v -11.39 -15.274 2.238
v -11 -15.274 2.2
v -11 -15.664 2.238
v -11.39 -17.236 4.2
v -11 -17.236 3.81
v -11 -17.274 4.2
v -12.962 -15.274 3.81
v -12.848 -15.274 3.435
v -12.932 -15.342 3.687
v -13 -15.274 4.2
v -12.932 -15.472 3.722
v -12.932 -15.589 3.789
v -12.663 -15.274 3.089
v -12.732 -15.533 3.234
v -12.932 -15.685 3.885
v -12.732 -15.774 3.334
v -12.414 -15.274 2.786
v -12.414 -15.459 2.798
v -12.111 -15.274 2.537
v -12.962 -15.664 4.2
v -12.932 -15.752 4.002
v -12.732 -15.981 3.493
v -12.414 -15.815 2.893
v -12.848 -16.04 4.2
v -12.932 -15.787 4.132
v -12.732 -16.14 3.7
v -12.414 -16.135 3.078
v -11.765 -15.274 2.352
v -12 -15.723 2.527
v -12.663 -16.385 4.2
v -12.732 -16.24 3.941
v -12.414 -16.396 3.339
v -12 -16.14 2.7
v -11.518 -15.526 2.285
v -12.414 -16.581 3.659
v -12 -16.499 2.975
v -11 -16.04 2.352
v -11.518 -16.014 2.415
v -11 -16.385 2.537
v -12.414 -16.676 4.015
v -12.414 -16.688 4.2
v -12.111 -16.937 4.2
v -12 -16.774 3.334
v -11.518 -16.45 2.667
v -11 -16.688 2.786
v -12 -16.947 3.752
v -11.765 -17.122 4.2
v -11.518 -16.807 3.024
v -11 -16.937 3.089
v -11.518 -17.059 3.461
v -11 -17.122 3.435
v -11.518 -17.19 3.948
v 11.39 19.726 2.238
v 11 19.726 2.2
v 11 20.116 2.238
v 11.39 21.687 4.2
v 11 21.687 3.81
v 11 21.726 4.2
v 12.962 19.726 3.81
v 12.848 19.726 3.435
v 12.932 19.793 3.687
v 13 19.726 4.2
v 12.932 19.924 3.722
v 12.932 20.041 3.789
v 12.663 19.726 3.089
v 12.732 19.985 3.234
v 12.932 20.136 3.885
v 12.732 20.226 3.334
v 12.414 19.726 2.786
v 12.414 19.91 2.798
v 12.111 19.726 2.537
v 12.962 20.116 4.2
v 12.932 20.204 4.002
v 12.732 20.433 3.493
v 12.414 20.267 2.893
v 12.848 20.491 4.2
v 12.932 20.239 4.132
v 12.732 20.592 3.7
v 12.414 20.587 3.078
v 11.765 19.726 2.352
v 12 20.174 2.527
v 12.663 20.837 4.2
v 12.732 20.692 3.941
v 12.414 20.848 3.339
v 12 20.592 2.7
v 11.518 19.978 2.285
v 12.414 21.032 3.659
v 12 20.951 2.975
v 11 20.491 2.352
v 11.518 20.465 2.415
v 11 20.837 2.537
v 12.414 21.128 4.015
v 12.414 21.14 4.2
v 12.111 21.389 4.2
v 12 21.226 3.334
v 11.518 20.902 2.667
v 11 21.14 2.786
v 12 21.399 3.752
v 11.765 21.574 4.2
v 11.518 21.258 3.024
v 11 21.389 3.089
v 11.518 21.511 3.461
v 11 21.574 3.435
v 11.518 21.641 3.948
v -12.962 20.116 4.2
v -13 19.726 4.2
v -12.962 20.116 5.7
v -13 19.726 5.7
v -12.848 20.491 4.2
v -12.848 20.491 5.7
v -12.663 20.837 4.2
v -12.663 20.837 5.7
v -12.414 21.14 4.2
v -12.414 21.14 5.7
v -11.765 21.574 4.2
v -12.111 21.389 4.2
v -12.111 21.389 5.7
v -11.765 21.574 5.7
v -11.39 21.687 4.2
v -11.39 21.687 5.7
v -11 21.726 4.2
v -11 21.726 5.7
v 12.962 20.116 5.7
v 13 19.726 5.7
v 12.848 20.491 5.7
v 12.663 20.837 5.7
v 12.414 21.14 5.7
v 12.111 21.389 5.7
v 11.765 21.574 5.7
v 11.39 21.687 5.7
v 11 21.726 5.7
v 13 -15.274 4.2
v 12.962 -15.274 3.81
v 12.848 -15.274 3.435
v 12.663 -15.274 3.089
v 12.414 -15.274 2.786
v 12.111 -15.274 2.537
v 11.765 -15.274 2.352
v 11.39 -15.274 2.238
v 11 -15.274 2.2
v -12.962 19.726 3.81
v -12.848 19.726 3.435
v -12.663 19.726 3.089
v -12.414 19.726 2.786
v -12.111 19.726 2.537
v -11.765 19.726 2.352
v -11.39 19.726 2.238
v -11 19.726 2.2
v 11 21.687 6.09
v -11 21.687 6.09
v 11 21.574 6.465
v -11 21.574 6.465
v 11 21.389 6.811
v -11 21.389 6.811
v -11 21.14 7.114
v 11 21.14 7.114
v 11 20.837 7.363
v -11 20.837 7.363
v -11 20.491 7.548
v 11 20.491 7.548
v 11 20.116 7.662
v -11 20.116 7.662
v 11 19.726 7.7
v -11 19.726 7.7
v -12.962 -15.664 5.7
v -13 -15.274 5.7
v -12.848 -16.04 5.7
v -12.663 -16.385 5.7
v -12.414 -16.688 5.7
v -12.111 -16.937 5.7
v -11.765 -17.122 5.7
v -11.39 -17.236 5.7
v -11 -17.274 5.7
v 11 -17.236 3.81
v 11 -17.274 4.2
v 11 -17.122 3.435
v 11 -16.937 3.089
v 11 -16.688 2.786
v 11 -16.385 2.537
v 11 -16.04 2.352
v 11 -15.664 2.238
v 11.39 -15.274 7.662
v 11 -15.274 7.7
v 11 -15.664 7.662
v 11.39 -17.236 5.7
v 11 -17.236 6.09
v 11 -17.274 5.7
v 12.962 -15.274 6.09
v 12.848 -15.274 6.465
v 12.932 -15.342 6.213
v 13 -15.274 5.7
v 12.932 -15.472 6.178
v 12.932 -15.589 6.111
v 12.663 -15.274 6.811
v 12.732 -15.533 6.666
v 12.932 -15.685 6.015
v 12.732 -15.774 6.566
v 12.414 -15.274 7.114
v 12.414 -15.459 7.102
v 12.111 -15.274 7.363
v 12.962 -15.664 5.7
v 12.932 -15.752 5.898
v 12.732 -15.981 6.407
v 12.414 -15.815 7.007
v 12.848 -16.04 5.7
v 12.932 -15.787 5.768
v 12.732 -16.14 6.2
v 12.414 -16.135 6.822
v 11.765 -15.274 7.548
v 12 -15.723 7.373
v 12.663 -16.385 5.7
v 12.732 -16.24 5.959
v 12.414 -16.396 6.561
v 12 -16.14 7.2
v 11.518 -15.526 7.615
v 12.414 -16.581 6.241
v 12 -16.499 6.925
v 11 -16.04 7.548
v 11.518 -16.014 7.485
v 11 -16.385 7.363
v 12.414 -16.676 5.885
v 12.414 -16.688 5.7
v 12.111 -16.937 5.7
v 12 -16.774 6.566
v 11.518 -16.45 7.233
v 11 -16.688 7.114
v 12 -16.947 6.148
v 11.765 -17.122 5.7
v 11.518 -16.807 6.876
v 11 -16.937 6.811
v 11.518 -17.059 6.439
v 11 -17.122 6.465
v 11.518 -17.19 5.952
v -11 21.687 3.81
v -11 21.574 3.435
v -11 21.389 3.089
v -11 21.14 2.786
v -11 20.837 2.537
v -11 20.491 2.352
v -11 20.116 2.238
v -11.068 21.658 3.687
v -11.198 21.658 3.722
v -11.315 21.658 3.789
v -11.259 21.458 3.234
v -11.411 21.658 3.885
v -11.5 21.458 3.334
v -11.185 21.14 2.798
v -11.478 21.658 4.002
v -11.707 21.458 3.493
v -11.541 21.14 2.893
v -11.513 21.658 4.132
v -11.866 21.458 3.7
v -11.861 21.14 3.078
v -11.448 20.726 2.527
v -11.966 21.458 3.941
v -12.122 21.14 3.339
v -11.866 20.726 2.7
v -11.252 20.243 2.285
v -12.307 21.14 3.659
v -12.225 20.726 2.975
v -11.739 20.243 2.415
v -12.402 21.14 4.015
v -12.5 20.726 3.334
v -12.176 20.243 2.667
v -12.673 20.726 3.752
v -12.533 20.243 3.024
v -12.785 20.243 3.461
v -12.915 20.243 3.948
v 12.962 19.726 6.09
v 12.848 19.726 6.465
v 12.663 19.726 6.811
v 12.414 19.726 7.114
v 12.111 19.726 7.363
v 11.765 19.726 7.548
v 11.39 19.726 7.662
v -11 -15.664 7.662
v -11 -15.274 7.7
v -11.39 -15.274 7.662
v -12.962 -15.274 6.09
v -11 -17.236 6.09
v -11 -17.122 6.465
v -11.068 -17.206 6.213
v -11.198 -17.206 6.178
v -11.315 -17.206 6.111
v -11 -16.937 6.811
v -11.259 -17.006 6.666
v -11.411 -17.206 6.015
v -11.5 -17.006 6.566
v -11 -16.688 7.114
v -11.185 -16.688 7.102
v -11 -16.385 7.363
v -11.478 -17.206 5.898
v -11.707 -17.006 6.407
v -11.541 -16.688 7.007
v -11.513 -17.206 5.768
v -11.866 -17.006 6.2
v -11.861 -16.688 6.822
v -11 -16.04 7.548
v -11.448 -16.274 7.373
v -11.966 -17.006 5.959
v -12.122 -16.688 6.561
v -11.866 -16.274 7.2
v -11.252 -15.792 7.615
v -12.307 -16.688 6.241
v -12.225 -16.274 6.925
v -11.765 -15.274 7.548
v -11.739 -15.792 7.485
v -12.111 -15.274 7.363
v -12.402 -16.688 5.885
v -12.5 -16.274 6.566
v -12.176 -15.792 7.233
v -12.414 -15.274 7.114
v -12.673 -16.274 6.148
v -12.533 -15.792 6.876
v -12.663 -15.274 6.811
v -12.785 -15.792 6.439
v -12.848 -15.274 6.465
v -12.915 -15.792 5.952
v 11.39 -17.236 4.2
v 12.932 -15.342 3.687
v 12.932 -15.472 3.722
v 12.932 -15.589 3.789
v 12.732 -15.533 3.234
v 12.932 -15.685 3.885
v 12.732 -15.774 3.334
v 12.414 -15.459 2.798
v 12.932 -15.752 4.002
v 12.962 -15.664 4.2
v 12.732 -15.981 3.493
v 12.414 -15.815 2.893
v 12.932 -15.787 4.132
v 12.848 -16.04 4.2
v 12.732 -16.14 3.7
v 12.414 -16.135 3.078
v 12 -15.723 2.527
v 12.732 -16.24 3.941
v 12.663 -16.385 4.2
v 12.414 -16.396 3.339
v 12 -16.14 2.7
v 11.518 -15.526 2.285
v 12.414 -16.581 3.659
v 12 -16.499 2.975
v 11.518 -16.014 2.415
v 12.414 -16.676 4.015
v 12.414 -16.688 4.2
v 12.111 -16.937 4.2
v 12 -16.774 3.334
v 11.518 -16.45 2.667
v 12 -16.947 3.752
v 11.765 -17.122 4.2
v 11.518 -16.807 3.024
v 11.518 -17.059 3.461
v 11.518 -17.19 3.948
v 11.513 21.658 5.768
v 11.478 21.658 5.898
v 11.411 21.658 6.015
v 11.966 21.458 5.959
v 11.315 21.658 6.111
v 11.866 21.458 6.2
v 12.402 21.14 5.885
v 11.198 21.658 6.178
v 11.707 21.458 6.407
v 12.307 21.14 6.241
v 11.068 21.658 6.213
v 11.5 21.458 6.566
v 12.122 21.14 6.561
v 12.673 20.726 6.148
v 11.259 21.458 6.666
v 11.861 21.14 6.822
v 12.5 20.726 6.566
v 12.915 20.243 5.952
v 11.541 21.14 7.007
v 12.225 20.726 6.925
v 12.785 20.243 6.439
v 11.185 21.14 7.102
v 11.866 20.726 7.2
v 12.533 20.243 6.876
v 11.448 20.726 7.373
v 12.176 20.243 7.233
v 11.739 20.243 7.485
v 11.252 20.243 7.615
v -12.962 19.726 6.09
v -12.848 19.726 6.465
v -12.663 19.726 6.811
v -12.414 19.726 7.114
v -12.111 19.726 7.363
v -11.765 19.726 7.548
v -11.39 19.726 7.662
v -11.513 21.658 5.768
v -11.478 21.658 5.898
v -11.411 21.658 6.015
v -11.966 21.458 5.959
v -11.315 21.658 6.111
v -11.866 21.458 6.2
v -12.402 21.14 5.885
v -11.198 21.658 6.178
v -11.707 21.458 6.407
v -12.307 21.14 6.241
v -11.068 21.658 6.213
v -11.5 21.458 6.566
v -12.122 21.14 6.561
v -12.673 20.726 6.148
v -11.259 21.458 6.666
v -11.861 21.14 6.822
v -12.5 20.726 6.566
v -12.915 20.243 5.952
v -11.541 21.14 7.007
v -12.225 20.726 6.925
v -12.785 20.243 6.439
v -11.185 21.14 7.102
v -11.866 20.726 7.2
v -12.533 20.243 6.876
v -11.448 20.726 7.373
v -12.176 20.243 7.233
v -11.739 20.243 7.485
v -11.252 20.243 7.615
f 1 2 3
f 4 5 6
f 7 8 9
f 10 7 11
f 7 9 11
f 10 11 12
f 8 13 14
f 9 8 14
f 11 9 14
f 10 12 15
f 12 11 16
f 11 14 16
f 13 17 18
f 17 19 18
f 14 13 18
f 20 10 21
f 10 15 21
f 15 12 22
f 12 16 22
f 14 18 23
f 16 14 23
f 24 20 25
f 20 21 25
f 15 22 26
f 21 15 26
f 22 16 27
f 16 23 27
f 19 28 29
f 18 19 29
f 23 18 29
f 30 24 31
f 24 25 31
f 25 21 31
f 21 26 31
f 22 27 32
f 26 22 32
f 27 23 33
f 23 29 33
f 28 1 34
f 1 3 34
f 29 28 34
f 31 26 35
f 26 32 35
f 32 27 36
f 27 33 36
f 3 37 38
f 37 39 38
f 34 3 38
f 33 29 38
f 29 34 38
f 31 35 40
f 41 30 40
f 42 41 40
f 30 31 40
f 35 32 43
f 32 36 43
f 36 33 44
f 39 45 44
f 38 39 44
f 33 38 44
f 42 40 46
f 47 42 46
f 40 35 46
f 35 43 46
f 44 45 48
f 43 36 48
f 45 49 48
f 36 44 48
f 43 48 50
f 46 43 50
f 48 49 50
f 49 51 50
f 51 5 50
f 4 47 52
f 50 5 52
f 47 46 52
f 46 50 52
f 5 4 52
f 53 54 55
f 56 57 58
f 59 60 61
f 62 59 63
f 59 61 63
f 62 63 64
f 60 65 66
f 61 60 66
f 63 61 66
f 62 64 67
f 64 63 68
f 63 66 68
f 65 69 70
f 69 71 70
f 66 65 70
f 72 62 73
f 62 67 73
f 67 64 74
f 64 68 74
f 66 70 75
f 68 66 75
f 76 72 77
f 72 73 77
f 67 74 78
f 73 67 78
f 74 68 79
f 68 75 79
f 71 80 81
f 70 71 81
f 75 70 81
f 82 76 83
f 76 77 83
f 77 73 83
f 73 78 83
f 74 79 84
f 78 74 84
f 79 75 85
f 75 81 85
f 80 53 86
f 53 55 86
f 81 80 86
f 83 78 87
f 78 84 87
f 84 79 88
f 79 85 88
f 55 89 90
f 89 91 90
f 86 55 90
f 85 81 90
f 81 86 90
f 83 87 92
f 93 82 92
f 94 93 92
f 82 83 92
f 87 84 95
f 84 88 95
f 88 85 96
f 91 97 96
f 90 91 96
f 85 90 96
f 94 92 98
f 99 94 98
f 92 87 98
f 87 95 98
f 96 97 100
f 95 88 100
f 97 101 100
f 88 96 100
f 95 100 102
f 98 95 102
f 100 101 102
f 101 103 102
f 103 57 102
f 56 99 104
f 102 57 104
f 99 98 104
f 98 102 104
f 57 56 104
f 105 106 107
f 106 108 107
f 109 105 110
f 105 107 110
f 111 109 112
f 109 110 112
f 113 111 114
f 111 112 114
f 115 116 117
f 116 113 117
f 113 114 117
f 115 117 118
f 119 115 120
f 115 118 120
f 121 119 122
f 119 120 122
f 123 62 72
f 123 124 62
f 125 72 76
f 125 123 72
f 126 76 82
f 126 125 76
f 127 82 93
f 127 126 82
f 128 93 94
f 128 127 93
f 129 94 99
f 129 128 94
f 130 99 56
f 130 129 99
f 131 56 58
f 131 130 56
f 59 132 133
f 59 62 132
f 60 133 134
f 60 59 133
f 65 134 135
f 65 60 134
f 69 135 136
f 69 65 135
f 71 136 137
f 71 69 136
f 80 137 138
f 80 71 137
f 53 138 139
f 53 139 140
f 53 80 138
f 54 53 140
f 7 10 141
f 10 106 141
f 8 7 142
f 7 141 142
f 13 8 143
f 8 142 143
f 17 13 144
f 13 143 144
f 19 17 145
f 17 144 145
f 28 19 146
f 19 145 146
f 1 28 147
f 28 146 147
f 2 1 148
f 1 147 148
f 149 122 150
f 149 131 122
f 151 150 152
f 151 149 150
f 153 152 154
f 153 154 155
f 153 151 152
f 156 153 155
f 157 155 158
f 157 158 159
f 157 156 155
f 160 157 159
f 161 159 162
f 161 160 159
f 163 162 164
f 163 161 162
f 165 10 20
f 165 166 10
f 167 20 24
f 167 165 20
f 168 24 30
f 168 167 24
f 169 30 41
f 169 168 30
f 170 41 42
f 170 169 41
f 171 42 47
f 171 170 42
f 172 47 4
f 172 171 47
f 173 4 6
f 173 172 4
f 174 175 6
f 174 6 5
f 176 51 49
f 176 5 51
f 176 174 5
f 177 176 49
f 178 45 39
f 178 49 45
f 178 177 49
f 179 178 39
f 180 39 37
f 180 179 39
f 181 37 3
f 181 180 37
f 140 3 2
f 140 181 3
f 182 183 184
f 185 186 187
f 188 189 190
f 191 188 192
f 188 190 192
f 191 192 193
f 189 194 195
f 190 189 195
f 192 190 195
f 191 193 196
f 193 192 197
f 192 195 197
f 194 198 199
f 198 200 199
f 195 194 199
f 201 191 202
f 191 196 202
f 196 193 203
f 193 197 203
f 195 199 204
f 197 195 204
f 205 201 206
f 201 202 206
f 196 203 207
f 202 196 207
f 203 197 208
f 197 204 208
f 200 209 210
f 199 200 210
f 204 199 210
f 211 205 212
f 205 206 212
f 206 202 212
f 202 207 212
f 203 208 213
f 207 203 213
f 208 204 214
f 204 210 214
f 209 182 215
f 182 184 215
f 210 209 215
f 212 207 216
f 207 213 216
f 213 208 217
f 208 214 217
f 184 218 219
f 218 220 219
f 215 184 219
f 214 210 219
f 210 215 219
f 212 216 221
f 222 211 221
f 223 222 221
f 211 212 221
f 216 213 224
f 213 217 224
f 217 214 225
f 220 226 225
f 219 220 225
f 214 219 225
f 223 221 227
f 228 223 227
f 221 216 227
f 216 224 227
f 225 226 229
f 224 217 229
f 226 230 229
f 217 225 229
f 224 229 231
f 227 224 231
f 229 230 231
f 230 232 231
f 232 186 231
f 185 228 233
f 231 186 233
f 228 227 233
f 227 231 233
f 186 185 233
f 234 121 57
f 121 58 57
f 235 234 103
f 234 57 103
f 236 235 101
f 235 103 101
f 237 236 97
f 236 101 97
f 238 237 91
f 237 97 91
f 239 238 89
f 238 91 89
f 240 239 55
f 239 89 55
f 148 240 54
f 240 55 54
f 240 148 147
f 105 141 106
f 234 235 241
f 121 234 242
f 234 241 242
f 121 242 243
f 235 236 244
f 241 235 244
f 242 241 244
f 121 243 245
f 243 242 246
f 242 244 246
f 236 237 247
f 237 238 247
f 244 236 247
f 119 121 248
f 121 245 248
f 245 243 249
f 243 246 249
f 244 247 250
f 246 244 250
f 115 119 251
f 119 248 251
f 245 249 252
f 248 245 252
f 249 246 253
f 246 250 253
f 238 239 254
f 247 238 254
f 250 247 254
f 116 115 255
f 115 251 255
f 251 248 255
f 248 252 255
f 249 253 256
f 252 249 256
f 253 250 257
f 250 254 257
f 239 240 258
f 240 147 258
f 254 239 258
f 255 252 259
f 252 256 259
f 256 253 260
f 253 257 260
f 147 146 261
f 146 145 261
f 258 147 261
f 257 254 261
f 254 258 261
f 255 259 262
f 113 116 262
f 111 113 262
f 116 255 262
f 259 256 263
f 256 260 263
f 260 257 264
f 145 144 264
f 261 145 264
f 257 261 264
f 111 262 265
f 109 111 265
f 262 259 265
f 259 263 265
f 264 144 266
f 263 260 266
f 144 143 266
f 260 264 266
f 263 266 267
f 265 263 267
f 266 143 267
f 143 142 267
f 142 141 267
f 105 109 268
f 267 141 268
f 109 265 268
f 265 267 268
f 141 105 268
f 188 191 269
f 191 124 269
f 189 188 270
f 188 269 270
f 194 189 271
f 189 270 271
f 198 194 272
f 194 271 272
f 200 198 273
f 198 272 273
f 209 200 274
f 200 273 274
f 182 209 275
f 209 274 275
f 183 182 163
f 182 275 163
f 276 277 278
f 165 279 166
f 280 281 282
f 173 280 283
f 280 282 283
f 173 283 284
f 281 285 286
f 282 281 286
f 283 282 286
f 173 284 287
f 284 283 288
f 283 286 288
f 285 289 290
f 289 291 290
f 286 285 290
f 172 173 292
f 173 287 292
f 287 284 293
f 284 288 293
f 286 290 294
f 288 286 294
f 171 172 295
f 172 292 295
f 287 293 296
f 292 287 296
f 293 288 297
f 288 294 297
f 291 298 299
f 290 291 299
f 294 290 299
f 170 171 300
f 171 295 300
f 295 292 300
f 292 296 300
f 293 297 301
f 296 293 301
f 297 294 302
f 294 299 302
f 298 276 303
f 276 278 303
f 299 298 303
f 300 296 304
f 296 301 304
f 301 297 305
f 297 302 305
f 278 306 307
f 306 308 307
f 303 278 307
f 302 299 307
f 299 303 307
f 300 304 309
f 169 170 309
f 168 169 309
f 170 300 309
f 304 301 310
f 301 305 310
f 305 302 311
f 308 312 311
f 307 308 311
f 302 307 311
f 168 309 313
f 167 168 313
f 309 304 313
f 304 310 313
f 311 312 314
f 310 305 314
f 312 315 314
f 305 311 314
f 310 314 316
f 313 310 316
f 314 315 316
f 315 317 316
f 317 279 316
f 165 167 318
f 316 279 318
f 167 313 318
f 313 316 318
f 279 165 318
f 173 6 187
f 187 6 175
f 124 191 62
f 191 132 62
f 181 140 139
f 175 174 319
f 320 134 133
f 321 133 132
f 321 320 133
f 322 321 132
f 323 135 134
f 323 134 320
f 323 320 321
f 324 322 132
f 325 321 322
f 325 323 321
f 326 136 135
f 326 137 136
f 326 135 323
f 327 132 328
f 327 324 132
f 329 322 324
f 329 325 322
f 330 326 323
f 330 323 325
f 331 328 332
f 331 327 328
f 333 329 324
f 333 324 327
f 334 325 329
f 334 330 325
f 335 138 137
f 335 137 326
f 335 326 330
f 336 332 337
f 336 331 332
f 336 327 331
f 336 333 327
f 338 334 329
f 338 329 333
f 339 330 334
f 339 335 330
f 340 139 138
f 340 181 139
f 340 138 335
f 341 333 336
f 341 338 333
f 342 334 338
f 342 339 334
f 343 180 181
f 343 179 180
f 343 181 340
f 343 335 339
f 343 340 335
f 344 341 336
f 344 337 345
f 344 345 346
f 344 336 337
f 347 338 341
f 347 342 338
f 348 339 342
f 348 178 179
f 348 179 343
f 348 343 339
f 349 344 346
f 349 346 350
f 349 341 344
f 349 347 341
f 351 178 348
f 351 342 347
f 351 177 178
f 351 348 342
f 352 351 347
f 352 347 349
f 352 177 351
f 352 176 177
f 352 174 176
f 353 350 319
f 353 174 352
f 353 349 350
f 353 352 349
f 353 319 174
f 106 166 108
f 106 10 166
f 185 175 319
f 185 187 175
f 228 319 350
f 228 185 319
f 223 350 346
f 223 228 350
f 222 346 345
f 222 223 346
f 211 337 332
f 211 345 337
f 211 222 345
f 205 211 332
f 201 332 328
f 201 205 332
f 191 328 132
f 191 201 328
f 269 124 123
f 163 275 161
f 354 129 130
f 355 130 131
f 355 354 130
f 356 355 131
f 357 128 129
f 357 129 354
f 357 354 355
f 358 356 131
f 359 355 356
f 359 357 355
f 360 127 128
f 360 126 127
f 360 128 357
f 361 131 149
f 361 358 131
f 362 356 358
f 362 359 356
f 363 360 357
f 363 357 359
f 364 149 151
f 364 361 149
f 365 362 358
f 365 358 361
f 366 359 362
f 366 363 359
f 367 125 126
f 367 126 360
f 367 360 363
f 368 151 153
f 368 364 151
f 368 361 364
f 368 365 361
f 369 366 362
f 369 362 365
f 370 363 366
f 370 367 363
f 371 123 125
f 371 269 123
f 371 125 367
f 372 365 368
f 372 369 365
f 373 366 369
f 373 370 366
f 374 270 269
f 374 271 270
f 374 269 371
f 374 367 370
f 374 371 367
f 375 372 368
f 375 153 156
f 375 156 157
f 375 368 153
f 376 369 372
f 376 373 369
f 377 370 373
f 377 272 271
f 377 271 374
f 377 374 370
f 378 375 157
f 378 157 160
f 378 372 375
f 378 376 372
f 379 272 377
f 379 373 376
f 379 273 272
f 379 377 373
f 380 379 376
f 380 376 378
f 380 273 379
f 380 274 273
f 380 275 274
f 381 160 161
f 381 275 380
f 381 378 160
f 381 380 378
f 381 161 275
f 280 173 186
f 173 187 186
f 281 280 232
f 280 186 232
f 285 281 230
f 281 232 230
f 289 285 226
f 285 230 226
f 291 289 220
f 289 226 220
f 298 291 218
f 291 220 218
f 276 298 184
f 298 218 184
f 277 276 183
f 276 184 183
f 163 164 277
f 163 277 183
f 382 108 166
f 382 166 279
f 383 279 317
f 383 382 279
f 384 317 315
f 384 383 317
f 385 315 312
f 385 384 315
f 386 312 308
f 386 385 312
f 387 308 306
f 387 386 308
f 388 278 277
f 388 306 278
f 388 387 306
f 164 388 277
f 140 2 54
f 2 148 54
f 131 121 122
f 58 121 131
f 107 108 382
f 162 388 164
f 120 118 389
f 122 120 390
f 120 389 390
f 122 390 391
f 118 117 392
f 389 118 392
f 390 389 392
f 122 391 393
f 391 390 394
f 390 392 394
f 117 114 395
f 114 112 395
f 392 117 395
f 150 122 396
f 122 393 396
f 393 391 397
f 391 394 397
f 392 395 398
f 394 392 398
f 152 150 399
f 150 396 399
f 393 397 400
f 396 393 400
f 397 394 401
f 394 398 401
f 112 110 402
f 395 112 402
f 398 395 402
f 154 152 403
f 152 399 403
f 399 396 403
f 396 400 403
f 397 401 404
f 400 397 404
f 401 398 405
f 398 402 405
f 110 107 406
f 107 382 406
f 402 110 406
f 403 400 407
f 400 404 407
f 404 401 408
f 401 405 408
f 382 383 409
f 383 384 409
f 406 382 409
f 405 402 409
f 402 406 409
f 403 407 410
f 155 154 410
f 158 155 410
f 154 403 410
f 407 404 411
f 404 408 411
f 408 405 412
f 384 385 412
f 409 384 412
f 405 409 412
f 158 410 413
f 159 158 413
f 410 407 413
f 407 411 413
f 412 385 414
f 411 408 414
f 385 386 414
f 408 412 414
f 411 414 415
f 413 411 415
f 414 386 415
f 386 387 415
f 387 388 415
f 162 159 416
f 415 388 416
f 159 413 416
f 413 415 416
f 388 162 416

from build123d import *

# Parameters (mm, degrees)
BOSS_EXTRUDE1_START = 2.2
SKETCH1_W           = 26
SKETCH1_H           = 39
BOSS_EXTRUDE1_DEPTH = 5.5
FILLET1_R           = 2


with BuildPart() as part:
    # Sketch1 → Boss-Extrude1 (new body)
    with BuildSketch(Plane.XY.offset(BOSS_EXTRUDE1_START)):
        with Locations((0, 2.225783695)):
            Rectangle(SKETCH1_W, SKETCH1_H)
    extrude(amount=BOSS_EXTRUDE1_DEPTH)

    # Fillet1
    fillet1_edges = [part.edges().sort_by_distance(p)[0] for p in [
        (-13, 2.225783695, 7.7),
        (0, -17.274216305, 7.7),
        (13, 2.225783695, 7.7),
        (0, -17.274216305, 2.2),
        (-13, 2.225783695, 2.2),
        (0, 21.725783695, 2.2),
        (13, 2.225783695, 2.2),
        (13, -17.274216305, 4.95),
        (-13, -17.274216305, 4.95),
        (-13, 21.725783695, 4.95),
        (13, 21.725783695, 4.95),
        (0, 21.725783695, 7.7),
    ]]
    fillet(fillet1_edges, radius=FILLET1_R)


solid = part.part
